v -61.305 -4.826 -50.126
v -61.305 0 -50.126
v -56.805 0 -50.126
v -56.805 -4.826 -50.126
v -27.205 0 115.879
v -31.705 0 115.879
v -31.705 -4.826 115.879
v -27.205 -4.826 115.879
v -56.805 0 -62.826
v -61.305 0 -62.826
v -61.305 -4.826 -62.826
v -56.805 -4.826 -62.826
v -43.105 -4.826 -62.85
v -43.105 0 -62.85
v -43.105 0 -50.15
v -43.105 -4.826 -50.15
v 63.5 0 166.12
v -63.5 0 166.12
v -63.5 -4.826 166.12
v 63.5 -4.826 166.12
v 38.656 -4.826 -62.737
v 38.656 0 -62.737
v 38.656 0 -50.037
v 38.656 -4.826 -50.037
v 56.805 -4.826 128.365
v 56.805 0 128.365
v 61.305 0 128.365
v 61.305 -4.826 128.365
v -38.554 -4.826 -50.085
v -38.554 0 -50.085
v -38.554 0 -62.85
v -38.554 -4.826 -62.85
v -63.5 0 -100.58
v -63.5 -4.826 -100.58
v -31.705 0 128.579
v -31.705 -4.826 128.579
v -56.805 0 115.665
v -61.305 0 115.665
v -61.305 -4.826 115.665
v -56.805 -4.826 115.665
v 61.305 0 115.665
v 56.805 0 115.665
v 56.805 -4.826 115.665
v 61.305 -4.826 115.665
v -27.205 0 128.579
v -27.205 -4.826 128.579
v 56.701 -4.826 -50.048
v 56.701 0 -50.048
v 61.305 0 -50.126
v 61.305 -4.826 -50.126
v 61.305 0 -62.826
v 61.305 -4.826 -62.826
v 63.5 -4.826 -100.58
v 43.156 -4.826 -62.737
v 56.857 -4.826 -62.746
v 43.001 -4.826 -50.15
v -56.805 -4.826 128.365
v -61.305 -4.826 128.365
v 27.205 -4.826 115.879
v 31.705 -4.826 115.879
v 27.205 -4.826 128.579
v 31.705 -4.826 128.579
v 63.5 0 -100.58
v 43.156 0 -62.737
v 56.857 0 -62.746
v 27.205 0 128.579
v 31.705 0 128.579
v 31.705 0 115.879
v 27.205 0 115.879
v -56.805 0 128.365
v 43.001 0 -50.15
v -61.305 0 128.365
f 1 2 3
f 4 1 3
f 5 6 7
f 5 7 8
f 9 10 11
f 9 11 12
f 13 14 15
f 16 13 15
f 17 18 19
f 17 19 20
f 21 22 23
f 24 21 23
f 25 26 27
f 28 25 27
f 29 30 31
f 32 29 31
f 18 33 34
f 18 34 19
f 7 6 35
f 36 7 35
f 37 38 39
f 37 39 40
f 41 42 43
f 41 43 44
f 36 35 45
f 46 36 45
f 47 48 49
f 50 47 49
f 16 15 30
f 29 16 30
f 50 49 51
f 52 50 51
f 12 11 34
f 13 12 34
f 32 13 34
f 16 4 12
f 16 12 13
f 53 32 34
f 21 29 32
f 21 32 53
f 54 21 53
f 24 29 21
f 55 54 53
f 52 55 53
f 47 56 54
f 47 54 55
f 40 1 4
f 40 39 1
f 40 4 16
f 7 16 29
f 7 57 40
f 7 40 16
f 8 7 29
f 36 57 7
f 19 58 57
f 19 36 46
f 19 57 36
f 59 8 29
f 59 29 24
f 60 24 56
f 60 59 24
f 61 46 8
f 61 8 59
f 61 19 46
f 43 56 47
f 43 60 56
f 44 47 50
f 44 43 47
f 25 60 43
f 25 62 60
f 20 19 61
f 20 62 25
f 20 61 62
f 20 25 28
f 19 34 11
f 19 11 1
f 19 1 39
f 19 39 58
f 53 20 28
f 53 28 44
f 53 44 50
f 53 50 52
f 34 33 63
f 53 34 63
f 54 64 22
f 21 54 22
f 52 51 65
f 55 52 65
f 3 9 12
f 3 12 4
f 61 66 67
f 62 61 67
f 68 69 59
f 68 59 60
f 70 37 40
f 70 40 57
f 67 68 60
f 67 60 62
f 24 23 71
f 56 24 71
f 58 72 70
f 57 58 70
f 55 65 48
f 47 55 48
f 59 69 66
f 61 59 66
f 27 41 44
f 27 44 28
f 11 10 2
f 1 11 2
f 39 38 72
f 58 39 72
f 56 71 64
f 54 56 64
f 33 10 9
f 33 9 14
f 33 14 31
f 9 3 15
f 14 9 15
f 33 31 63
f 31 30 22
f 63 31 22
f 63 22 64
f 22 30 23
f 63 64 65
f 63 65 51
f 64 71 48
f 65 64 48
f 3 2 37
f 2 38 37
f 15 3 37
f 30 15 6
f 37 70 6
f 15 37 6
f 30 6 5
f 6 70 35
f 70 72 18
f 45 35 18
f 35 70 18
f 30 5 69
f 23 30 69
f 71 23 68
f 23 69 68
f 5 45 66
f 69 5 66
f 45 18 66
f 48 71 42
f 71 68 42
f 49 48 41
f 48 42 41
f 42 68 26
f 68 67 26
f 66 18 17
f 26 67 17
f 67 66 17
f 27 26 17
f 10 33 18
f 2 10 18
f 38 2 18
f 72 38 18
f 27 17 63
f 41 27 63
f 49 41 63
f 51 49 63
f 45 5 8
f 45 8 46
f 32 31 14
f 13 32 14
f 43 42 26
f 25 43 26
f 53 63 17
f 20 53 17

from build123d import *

# Parameters (mm, degrees)
F0_W     = 127
F0_H     = 266.7
F0_W_2   = 4.5
F0_H_2   = 12.7
F1_DEPTH = 4.826


with BuildPart() as f1:
    # F0 (on Front) → F1 (new body)
    with BuildSketch(Plane.XZ):
        with Locations((0, 32.769812)):
            Rectangle(F0_W, F0_H)
        with Locations((-59.054758, -56.475502)):
            Rectangle(F0_W_2, F0_H_2, mode=Mode.SUBTRACT)
        Polygon((-43.104758, -62.849627), (-43.104758, -50.149627), (-38.554112, -50.085164), (-38.554112, -62.849627), align=None, mode=Mode.SUBTRACT)
        Polygon((38.655718, -50.03741), (43.001247, -50.149624), (43.155718, -62.73741), (38.655718, -62.73741), align=None, mode=Mode.SUBTRACT)
        Polygon((56.856852, -62.745742), (56.701028, -50.047654), (61.304758, -50.125502), (61.304758, -62.825502), align=None, mode=Mode.SUBTRACT)
        with Locations((-59.054758, 122.015126)):
            Rectangle(F0_W_2, F0_H_2, mode=Mode.SUBTRACT)
        with Locations((-29.454758, 122.229226)):
            Rectangle(F0_W_2, F0_H_2, mode=Mode.SUBTRACT)
        with Locations((29.454758, 122.229226)):
            Rectangle(F0_W_2, F0_H_2, mode=Mode.SUBTRACT)
        with Locations((59.054758, 122.015126)):
            Rectangle(F0_W_2, F0_H_2, mode=Mode.SUBTRACT)
    extrude(amount=F1_DEPTH)


solid = f1.part
